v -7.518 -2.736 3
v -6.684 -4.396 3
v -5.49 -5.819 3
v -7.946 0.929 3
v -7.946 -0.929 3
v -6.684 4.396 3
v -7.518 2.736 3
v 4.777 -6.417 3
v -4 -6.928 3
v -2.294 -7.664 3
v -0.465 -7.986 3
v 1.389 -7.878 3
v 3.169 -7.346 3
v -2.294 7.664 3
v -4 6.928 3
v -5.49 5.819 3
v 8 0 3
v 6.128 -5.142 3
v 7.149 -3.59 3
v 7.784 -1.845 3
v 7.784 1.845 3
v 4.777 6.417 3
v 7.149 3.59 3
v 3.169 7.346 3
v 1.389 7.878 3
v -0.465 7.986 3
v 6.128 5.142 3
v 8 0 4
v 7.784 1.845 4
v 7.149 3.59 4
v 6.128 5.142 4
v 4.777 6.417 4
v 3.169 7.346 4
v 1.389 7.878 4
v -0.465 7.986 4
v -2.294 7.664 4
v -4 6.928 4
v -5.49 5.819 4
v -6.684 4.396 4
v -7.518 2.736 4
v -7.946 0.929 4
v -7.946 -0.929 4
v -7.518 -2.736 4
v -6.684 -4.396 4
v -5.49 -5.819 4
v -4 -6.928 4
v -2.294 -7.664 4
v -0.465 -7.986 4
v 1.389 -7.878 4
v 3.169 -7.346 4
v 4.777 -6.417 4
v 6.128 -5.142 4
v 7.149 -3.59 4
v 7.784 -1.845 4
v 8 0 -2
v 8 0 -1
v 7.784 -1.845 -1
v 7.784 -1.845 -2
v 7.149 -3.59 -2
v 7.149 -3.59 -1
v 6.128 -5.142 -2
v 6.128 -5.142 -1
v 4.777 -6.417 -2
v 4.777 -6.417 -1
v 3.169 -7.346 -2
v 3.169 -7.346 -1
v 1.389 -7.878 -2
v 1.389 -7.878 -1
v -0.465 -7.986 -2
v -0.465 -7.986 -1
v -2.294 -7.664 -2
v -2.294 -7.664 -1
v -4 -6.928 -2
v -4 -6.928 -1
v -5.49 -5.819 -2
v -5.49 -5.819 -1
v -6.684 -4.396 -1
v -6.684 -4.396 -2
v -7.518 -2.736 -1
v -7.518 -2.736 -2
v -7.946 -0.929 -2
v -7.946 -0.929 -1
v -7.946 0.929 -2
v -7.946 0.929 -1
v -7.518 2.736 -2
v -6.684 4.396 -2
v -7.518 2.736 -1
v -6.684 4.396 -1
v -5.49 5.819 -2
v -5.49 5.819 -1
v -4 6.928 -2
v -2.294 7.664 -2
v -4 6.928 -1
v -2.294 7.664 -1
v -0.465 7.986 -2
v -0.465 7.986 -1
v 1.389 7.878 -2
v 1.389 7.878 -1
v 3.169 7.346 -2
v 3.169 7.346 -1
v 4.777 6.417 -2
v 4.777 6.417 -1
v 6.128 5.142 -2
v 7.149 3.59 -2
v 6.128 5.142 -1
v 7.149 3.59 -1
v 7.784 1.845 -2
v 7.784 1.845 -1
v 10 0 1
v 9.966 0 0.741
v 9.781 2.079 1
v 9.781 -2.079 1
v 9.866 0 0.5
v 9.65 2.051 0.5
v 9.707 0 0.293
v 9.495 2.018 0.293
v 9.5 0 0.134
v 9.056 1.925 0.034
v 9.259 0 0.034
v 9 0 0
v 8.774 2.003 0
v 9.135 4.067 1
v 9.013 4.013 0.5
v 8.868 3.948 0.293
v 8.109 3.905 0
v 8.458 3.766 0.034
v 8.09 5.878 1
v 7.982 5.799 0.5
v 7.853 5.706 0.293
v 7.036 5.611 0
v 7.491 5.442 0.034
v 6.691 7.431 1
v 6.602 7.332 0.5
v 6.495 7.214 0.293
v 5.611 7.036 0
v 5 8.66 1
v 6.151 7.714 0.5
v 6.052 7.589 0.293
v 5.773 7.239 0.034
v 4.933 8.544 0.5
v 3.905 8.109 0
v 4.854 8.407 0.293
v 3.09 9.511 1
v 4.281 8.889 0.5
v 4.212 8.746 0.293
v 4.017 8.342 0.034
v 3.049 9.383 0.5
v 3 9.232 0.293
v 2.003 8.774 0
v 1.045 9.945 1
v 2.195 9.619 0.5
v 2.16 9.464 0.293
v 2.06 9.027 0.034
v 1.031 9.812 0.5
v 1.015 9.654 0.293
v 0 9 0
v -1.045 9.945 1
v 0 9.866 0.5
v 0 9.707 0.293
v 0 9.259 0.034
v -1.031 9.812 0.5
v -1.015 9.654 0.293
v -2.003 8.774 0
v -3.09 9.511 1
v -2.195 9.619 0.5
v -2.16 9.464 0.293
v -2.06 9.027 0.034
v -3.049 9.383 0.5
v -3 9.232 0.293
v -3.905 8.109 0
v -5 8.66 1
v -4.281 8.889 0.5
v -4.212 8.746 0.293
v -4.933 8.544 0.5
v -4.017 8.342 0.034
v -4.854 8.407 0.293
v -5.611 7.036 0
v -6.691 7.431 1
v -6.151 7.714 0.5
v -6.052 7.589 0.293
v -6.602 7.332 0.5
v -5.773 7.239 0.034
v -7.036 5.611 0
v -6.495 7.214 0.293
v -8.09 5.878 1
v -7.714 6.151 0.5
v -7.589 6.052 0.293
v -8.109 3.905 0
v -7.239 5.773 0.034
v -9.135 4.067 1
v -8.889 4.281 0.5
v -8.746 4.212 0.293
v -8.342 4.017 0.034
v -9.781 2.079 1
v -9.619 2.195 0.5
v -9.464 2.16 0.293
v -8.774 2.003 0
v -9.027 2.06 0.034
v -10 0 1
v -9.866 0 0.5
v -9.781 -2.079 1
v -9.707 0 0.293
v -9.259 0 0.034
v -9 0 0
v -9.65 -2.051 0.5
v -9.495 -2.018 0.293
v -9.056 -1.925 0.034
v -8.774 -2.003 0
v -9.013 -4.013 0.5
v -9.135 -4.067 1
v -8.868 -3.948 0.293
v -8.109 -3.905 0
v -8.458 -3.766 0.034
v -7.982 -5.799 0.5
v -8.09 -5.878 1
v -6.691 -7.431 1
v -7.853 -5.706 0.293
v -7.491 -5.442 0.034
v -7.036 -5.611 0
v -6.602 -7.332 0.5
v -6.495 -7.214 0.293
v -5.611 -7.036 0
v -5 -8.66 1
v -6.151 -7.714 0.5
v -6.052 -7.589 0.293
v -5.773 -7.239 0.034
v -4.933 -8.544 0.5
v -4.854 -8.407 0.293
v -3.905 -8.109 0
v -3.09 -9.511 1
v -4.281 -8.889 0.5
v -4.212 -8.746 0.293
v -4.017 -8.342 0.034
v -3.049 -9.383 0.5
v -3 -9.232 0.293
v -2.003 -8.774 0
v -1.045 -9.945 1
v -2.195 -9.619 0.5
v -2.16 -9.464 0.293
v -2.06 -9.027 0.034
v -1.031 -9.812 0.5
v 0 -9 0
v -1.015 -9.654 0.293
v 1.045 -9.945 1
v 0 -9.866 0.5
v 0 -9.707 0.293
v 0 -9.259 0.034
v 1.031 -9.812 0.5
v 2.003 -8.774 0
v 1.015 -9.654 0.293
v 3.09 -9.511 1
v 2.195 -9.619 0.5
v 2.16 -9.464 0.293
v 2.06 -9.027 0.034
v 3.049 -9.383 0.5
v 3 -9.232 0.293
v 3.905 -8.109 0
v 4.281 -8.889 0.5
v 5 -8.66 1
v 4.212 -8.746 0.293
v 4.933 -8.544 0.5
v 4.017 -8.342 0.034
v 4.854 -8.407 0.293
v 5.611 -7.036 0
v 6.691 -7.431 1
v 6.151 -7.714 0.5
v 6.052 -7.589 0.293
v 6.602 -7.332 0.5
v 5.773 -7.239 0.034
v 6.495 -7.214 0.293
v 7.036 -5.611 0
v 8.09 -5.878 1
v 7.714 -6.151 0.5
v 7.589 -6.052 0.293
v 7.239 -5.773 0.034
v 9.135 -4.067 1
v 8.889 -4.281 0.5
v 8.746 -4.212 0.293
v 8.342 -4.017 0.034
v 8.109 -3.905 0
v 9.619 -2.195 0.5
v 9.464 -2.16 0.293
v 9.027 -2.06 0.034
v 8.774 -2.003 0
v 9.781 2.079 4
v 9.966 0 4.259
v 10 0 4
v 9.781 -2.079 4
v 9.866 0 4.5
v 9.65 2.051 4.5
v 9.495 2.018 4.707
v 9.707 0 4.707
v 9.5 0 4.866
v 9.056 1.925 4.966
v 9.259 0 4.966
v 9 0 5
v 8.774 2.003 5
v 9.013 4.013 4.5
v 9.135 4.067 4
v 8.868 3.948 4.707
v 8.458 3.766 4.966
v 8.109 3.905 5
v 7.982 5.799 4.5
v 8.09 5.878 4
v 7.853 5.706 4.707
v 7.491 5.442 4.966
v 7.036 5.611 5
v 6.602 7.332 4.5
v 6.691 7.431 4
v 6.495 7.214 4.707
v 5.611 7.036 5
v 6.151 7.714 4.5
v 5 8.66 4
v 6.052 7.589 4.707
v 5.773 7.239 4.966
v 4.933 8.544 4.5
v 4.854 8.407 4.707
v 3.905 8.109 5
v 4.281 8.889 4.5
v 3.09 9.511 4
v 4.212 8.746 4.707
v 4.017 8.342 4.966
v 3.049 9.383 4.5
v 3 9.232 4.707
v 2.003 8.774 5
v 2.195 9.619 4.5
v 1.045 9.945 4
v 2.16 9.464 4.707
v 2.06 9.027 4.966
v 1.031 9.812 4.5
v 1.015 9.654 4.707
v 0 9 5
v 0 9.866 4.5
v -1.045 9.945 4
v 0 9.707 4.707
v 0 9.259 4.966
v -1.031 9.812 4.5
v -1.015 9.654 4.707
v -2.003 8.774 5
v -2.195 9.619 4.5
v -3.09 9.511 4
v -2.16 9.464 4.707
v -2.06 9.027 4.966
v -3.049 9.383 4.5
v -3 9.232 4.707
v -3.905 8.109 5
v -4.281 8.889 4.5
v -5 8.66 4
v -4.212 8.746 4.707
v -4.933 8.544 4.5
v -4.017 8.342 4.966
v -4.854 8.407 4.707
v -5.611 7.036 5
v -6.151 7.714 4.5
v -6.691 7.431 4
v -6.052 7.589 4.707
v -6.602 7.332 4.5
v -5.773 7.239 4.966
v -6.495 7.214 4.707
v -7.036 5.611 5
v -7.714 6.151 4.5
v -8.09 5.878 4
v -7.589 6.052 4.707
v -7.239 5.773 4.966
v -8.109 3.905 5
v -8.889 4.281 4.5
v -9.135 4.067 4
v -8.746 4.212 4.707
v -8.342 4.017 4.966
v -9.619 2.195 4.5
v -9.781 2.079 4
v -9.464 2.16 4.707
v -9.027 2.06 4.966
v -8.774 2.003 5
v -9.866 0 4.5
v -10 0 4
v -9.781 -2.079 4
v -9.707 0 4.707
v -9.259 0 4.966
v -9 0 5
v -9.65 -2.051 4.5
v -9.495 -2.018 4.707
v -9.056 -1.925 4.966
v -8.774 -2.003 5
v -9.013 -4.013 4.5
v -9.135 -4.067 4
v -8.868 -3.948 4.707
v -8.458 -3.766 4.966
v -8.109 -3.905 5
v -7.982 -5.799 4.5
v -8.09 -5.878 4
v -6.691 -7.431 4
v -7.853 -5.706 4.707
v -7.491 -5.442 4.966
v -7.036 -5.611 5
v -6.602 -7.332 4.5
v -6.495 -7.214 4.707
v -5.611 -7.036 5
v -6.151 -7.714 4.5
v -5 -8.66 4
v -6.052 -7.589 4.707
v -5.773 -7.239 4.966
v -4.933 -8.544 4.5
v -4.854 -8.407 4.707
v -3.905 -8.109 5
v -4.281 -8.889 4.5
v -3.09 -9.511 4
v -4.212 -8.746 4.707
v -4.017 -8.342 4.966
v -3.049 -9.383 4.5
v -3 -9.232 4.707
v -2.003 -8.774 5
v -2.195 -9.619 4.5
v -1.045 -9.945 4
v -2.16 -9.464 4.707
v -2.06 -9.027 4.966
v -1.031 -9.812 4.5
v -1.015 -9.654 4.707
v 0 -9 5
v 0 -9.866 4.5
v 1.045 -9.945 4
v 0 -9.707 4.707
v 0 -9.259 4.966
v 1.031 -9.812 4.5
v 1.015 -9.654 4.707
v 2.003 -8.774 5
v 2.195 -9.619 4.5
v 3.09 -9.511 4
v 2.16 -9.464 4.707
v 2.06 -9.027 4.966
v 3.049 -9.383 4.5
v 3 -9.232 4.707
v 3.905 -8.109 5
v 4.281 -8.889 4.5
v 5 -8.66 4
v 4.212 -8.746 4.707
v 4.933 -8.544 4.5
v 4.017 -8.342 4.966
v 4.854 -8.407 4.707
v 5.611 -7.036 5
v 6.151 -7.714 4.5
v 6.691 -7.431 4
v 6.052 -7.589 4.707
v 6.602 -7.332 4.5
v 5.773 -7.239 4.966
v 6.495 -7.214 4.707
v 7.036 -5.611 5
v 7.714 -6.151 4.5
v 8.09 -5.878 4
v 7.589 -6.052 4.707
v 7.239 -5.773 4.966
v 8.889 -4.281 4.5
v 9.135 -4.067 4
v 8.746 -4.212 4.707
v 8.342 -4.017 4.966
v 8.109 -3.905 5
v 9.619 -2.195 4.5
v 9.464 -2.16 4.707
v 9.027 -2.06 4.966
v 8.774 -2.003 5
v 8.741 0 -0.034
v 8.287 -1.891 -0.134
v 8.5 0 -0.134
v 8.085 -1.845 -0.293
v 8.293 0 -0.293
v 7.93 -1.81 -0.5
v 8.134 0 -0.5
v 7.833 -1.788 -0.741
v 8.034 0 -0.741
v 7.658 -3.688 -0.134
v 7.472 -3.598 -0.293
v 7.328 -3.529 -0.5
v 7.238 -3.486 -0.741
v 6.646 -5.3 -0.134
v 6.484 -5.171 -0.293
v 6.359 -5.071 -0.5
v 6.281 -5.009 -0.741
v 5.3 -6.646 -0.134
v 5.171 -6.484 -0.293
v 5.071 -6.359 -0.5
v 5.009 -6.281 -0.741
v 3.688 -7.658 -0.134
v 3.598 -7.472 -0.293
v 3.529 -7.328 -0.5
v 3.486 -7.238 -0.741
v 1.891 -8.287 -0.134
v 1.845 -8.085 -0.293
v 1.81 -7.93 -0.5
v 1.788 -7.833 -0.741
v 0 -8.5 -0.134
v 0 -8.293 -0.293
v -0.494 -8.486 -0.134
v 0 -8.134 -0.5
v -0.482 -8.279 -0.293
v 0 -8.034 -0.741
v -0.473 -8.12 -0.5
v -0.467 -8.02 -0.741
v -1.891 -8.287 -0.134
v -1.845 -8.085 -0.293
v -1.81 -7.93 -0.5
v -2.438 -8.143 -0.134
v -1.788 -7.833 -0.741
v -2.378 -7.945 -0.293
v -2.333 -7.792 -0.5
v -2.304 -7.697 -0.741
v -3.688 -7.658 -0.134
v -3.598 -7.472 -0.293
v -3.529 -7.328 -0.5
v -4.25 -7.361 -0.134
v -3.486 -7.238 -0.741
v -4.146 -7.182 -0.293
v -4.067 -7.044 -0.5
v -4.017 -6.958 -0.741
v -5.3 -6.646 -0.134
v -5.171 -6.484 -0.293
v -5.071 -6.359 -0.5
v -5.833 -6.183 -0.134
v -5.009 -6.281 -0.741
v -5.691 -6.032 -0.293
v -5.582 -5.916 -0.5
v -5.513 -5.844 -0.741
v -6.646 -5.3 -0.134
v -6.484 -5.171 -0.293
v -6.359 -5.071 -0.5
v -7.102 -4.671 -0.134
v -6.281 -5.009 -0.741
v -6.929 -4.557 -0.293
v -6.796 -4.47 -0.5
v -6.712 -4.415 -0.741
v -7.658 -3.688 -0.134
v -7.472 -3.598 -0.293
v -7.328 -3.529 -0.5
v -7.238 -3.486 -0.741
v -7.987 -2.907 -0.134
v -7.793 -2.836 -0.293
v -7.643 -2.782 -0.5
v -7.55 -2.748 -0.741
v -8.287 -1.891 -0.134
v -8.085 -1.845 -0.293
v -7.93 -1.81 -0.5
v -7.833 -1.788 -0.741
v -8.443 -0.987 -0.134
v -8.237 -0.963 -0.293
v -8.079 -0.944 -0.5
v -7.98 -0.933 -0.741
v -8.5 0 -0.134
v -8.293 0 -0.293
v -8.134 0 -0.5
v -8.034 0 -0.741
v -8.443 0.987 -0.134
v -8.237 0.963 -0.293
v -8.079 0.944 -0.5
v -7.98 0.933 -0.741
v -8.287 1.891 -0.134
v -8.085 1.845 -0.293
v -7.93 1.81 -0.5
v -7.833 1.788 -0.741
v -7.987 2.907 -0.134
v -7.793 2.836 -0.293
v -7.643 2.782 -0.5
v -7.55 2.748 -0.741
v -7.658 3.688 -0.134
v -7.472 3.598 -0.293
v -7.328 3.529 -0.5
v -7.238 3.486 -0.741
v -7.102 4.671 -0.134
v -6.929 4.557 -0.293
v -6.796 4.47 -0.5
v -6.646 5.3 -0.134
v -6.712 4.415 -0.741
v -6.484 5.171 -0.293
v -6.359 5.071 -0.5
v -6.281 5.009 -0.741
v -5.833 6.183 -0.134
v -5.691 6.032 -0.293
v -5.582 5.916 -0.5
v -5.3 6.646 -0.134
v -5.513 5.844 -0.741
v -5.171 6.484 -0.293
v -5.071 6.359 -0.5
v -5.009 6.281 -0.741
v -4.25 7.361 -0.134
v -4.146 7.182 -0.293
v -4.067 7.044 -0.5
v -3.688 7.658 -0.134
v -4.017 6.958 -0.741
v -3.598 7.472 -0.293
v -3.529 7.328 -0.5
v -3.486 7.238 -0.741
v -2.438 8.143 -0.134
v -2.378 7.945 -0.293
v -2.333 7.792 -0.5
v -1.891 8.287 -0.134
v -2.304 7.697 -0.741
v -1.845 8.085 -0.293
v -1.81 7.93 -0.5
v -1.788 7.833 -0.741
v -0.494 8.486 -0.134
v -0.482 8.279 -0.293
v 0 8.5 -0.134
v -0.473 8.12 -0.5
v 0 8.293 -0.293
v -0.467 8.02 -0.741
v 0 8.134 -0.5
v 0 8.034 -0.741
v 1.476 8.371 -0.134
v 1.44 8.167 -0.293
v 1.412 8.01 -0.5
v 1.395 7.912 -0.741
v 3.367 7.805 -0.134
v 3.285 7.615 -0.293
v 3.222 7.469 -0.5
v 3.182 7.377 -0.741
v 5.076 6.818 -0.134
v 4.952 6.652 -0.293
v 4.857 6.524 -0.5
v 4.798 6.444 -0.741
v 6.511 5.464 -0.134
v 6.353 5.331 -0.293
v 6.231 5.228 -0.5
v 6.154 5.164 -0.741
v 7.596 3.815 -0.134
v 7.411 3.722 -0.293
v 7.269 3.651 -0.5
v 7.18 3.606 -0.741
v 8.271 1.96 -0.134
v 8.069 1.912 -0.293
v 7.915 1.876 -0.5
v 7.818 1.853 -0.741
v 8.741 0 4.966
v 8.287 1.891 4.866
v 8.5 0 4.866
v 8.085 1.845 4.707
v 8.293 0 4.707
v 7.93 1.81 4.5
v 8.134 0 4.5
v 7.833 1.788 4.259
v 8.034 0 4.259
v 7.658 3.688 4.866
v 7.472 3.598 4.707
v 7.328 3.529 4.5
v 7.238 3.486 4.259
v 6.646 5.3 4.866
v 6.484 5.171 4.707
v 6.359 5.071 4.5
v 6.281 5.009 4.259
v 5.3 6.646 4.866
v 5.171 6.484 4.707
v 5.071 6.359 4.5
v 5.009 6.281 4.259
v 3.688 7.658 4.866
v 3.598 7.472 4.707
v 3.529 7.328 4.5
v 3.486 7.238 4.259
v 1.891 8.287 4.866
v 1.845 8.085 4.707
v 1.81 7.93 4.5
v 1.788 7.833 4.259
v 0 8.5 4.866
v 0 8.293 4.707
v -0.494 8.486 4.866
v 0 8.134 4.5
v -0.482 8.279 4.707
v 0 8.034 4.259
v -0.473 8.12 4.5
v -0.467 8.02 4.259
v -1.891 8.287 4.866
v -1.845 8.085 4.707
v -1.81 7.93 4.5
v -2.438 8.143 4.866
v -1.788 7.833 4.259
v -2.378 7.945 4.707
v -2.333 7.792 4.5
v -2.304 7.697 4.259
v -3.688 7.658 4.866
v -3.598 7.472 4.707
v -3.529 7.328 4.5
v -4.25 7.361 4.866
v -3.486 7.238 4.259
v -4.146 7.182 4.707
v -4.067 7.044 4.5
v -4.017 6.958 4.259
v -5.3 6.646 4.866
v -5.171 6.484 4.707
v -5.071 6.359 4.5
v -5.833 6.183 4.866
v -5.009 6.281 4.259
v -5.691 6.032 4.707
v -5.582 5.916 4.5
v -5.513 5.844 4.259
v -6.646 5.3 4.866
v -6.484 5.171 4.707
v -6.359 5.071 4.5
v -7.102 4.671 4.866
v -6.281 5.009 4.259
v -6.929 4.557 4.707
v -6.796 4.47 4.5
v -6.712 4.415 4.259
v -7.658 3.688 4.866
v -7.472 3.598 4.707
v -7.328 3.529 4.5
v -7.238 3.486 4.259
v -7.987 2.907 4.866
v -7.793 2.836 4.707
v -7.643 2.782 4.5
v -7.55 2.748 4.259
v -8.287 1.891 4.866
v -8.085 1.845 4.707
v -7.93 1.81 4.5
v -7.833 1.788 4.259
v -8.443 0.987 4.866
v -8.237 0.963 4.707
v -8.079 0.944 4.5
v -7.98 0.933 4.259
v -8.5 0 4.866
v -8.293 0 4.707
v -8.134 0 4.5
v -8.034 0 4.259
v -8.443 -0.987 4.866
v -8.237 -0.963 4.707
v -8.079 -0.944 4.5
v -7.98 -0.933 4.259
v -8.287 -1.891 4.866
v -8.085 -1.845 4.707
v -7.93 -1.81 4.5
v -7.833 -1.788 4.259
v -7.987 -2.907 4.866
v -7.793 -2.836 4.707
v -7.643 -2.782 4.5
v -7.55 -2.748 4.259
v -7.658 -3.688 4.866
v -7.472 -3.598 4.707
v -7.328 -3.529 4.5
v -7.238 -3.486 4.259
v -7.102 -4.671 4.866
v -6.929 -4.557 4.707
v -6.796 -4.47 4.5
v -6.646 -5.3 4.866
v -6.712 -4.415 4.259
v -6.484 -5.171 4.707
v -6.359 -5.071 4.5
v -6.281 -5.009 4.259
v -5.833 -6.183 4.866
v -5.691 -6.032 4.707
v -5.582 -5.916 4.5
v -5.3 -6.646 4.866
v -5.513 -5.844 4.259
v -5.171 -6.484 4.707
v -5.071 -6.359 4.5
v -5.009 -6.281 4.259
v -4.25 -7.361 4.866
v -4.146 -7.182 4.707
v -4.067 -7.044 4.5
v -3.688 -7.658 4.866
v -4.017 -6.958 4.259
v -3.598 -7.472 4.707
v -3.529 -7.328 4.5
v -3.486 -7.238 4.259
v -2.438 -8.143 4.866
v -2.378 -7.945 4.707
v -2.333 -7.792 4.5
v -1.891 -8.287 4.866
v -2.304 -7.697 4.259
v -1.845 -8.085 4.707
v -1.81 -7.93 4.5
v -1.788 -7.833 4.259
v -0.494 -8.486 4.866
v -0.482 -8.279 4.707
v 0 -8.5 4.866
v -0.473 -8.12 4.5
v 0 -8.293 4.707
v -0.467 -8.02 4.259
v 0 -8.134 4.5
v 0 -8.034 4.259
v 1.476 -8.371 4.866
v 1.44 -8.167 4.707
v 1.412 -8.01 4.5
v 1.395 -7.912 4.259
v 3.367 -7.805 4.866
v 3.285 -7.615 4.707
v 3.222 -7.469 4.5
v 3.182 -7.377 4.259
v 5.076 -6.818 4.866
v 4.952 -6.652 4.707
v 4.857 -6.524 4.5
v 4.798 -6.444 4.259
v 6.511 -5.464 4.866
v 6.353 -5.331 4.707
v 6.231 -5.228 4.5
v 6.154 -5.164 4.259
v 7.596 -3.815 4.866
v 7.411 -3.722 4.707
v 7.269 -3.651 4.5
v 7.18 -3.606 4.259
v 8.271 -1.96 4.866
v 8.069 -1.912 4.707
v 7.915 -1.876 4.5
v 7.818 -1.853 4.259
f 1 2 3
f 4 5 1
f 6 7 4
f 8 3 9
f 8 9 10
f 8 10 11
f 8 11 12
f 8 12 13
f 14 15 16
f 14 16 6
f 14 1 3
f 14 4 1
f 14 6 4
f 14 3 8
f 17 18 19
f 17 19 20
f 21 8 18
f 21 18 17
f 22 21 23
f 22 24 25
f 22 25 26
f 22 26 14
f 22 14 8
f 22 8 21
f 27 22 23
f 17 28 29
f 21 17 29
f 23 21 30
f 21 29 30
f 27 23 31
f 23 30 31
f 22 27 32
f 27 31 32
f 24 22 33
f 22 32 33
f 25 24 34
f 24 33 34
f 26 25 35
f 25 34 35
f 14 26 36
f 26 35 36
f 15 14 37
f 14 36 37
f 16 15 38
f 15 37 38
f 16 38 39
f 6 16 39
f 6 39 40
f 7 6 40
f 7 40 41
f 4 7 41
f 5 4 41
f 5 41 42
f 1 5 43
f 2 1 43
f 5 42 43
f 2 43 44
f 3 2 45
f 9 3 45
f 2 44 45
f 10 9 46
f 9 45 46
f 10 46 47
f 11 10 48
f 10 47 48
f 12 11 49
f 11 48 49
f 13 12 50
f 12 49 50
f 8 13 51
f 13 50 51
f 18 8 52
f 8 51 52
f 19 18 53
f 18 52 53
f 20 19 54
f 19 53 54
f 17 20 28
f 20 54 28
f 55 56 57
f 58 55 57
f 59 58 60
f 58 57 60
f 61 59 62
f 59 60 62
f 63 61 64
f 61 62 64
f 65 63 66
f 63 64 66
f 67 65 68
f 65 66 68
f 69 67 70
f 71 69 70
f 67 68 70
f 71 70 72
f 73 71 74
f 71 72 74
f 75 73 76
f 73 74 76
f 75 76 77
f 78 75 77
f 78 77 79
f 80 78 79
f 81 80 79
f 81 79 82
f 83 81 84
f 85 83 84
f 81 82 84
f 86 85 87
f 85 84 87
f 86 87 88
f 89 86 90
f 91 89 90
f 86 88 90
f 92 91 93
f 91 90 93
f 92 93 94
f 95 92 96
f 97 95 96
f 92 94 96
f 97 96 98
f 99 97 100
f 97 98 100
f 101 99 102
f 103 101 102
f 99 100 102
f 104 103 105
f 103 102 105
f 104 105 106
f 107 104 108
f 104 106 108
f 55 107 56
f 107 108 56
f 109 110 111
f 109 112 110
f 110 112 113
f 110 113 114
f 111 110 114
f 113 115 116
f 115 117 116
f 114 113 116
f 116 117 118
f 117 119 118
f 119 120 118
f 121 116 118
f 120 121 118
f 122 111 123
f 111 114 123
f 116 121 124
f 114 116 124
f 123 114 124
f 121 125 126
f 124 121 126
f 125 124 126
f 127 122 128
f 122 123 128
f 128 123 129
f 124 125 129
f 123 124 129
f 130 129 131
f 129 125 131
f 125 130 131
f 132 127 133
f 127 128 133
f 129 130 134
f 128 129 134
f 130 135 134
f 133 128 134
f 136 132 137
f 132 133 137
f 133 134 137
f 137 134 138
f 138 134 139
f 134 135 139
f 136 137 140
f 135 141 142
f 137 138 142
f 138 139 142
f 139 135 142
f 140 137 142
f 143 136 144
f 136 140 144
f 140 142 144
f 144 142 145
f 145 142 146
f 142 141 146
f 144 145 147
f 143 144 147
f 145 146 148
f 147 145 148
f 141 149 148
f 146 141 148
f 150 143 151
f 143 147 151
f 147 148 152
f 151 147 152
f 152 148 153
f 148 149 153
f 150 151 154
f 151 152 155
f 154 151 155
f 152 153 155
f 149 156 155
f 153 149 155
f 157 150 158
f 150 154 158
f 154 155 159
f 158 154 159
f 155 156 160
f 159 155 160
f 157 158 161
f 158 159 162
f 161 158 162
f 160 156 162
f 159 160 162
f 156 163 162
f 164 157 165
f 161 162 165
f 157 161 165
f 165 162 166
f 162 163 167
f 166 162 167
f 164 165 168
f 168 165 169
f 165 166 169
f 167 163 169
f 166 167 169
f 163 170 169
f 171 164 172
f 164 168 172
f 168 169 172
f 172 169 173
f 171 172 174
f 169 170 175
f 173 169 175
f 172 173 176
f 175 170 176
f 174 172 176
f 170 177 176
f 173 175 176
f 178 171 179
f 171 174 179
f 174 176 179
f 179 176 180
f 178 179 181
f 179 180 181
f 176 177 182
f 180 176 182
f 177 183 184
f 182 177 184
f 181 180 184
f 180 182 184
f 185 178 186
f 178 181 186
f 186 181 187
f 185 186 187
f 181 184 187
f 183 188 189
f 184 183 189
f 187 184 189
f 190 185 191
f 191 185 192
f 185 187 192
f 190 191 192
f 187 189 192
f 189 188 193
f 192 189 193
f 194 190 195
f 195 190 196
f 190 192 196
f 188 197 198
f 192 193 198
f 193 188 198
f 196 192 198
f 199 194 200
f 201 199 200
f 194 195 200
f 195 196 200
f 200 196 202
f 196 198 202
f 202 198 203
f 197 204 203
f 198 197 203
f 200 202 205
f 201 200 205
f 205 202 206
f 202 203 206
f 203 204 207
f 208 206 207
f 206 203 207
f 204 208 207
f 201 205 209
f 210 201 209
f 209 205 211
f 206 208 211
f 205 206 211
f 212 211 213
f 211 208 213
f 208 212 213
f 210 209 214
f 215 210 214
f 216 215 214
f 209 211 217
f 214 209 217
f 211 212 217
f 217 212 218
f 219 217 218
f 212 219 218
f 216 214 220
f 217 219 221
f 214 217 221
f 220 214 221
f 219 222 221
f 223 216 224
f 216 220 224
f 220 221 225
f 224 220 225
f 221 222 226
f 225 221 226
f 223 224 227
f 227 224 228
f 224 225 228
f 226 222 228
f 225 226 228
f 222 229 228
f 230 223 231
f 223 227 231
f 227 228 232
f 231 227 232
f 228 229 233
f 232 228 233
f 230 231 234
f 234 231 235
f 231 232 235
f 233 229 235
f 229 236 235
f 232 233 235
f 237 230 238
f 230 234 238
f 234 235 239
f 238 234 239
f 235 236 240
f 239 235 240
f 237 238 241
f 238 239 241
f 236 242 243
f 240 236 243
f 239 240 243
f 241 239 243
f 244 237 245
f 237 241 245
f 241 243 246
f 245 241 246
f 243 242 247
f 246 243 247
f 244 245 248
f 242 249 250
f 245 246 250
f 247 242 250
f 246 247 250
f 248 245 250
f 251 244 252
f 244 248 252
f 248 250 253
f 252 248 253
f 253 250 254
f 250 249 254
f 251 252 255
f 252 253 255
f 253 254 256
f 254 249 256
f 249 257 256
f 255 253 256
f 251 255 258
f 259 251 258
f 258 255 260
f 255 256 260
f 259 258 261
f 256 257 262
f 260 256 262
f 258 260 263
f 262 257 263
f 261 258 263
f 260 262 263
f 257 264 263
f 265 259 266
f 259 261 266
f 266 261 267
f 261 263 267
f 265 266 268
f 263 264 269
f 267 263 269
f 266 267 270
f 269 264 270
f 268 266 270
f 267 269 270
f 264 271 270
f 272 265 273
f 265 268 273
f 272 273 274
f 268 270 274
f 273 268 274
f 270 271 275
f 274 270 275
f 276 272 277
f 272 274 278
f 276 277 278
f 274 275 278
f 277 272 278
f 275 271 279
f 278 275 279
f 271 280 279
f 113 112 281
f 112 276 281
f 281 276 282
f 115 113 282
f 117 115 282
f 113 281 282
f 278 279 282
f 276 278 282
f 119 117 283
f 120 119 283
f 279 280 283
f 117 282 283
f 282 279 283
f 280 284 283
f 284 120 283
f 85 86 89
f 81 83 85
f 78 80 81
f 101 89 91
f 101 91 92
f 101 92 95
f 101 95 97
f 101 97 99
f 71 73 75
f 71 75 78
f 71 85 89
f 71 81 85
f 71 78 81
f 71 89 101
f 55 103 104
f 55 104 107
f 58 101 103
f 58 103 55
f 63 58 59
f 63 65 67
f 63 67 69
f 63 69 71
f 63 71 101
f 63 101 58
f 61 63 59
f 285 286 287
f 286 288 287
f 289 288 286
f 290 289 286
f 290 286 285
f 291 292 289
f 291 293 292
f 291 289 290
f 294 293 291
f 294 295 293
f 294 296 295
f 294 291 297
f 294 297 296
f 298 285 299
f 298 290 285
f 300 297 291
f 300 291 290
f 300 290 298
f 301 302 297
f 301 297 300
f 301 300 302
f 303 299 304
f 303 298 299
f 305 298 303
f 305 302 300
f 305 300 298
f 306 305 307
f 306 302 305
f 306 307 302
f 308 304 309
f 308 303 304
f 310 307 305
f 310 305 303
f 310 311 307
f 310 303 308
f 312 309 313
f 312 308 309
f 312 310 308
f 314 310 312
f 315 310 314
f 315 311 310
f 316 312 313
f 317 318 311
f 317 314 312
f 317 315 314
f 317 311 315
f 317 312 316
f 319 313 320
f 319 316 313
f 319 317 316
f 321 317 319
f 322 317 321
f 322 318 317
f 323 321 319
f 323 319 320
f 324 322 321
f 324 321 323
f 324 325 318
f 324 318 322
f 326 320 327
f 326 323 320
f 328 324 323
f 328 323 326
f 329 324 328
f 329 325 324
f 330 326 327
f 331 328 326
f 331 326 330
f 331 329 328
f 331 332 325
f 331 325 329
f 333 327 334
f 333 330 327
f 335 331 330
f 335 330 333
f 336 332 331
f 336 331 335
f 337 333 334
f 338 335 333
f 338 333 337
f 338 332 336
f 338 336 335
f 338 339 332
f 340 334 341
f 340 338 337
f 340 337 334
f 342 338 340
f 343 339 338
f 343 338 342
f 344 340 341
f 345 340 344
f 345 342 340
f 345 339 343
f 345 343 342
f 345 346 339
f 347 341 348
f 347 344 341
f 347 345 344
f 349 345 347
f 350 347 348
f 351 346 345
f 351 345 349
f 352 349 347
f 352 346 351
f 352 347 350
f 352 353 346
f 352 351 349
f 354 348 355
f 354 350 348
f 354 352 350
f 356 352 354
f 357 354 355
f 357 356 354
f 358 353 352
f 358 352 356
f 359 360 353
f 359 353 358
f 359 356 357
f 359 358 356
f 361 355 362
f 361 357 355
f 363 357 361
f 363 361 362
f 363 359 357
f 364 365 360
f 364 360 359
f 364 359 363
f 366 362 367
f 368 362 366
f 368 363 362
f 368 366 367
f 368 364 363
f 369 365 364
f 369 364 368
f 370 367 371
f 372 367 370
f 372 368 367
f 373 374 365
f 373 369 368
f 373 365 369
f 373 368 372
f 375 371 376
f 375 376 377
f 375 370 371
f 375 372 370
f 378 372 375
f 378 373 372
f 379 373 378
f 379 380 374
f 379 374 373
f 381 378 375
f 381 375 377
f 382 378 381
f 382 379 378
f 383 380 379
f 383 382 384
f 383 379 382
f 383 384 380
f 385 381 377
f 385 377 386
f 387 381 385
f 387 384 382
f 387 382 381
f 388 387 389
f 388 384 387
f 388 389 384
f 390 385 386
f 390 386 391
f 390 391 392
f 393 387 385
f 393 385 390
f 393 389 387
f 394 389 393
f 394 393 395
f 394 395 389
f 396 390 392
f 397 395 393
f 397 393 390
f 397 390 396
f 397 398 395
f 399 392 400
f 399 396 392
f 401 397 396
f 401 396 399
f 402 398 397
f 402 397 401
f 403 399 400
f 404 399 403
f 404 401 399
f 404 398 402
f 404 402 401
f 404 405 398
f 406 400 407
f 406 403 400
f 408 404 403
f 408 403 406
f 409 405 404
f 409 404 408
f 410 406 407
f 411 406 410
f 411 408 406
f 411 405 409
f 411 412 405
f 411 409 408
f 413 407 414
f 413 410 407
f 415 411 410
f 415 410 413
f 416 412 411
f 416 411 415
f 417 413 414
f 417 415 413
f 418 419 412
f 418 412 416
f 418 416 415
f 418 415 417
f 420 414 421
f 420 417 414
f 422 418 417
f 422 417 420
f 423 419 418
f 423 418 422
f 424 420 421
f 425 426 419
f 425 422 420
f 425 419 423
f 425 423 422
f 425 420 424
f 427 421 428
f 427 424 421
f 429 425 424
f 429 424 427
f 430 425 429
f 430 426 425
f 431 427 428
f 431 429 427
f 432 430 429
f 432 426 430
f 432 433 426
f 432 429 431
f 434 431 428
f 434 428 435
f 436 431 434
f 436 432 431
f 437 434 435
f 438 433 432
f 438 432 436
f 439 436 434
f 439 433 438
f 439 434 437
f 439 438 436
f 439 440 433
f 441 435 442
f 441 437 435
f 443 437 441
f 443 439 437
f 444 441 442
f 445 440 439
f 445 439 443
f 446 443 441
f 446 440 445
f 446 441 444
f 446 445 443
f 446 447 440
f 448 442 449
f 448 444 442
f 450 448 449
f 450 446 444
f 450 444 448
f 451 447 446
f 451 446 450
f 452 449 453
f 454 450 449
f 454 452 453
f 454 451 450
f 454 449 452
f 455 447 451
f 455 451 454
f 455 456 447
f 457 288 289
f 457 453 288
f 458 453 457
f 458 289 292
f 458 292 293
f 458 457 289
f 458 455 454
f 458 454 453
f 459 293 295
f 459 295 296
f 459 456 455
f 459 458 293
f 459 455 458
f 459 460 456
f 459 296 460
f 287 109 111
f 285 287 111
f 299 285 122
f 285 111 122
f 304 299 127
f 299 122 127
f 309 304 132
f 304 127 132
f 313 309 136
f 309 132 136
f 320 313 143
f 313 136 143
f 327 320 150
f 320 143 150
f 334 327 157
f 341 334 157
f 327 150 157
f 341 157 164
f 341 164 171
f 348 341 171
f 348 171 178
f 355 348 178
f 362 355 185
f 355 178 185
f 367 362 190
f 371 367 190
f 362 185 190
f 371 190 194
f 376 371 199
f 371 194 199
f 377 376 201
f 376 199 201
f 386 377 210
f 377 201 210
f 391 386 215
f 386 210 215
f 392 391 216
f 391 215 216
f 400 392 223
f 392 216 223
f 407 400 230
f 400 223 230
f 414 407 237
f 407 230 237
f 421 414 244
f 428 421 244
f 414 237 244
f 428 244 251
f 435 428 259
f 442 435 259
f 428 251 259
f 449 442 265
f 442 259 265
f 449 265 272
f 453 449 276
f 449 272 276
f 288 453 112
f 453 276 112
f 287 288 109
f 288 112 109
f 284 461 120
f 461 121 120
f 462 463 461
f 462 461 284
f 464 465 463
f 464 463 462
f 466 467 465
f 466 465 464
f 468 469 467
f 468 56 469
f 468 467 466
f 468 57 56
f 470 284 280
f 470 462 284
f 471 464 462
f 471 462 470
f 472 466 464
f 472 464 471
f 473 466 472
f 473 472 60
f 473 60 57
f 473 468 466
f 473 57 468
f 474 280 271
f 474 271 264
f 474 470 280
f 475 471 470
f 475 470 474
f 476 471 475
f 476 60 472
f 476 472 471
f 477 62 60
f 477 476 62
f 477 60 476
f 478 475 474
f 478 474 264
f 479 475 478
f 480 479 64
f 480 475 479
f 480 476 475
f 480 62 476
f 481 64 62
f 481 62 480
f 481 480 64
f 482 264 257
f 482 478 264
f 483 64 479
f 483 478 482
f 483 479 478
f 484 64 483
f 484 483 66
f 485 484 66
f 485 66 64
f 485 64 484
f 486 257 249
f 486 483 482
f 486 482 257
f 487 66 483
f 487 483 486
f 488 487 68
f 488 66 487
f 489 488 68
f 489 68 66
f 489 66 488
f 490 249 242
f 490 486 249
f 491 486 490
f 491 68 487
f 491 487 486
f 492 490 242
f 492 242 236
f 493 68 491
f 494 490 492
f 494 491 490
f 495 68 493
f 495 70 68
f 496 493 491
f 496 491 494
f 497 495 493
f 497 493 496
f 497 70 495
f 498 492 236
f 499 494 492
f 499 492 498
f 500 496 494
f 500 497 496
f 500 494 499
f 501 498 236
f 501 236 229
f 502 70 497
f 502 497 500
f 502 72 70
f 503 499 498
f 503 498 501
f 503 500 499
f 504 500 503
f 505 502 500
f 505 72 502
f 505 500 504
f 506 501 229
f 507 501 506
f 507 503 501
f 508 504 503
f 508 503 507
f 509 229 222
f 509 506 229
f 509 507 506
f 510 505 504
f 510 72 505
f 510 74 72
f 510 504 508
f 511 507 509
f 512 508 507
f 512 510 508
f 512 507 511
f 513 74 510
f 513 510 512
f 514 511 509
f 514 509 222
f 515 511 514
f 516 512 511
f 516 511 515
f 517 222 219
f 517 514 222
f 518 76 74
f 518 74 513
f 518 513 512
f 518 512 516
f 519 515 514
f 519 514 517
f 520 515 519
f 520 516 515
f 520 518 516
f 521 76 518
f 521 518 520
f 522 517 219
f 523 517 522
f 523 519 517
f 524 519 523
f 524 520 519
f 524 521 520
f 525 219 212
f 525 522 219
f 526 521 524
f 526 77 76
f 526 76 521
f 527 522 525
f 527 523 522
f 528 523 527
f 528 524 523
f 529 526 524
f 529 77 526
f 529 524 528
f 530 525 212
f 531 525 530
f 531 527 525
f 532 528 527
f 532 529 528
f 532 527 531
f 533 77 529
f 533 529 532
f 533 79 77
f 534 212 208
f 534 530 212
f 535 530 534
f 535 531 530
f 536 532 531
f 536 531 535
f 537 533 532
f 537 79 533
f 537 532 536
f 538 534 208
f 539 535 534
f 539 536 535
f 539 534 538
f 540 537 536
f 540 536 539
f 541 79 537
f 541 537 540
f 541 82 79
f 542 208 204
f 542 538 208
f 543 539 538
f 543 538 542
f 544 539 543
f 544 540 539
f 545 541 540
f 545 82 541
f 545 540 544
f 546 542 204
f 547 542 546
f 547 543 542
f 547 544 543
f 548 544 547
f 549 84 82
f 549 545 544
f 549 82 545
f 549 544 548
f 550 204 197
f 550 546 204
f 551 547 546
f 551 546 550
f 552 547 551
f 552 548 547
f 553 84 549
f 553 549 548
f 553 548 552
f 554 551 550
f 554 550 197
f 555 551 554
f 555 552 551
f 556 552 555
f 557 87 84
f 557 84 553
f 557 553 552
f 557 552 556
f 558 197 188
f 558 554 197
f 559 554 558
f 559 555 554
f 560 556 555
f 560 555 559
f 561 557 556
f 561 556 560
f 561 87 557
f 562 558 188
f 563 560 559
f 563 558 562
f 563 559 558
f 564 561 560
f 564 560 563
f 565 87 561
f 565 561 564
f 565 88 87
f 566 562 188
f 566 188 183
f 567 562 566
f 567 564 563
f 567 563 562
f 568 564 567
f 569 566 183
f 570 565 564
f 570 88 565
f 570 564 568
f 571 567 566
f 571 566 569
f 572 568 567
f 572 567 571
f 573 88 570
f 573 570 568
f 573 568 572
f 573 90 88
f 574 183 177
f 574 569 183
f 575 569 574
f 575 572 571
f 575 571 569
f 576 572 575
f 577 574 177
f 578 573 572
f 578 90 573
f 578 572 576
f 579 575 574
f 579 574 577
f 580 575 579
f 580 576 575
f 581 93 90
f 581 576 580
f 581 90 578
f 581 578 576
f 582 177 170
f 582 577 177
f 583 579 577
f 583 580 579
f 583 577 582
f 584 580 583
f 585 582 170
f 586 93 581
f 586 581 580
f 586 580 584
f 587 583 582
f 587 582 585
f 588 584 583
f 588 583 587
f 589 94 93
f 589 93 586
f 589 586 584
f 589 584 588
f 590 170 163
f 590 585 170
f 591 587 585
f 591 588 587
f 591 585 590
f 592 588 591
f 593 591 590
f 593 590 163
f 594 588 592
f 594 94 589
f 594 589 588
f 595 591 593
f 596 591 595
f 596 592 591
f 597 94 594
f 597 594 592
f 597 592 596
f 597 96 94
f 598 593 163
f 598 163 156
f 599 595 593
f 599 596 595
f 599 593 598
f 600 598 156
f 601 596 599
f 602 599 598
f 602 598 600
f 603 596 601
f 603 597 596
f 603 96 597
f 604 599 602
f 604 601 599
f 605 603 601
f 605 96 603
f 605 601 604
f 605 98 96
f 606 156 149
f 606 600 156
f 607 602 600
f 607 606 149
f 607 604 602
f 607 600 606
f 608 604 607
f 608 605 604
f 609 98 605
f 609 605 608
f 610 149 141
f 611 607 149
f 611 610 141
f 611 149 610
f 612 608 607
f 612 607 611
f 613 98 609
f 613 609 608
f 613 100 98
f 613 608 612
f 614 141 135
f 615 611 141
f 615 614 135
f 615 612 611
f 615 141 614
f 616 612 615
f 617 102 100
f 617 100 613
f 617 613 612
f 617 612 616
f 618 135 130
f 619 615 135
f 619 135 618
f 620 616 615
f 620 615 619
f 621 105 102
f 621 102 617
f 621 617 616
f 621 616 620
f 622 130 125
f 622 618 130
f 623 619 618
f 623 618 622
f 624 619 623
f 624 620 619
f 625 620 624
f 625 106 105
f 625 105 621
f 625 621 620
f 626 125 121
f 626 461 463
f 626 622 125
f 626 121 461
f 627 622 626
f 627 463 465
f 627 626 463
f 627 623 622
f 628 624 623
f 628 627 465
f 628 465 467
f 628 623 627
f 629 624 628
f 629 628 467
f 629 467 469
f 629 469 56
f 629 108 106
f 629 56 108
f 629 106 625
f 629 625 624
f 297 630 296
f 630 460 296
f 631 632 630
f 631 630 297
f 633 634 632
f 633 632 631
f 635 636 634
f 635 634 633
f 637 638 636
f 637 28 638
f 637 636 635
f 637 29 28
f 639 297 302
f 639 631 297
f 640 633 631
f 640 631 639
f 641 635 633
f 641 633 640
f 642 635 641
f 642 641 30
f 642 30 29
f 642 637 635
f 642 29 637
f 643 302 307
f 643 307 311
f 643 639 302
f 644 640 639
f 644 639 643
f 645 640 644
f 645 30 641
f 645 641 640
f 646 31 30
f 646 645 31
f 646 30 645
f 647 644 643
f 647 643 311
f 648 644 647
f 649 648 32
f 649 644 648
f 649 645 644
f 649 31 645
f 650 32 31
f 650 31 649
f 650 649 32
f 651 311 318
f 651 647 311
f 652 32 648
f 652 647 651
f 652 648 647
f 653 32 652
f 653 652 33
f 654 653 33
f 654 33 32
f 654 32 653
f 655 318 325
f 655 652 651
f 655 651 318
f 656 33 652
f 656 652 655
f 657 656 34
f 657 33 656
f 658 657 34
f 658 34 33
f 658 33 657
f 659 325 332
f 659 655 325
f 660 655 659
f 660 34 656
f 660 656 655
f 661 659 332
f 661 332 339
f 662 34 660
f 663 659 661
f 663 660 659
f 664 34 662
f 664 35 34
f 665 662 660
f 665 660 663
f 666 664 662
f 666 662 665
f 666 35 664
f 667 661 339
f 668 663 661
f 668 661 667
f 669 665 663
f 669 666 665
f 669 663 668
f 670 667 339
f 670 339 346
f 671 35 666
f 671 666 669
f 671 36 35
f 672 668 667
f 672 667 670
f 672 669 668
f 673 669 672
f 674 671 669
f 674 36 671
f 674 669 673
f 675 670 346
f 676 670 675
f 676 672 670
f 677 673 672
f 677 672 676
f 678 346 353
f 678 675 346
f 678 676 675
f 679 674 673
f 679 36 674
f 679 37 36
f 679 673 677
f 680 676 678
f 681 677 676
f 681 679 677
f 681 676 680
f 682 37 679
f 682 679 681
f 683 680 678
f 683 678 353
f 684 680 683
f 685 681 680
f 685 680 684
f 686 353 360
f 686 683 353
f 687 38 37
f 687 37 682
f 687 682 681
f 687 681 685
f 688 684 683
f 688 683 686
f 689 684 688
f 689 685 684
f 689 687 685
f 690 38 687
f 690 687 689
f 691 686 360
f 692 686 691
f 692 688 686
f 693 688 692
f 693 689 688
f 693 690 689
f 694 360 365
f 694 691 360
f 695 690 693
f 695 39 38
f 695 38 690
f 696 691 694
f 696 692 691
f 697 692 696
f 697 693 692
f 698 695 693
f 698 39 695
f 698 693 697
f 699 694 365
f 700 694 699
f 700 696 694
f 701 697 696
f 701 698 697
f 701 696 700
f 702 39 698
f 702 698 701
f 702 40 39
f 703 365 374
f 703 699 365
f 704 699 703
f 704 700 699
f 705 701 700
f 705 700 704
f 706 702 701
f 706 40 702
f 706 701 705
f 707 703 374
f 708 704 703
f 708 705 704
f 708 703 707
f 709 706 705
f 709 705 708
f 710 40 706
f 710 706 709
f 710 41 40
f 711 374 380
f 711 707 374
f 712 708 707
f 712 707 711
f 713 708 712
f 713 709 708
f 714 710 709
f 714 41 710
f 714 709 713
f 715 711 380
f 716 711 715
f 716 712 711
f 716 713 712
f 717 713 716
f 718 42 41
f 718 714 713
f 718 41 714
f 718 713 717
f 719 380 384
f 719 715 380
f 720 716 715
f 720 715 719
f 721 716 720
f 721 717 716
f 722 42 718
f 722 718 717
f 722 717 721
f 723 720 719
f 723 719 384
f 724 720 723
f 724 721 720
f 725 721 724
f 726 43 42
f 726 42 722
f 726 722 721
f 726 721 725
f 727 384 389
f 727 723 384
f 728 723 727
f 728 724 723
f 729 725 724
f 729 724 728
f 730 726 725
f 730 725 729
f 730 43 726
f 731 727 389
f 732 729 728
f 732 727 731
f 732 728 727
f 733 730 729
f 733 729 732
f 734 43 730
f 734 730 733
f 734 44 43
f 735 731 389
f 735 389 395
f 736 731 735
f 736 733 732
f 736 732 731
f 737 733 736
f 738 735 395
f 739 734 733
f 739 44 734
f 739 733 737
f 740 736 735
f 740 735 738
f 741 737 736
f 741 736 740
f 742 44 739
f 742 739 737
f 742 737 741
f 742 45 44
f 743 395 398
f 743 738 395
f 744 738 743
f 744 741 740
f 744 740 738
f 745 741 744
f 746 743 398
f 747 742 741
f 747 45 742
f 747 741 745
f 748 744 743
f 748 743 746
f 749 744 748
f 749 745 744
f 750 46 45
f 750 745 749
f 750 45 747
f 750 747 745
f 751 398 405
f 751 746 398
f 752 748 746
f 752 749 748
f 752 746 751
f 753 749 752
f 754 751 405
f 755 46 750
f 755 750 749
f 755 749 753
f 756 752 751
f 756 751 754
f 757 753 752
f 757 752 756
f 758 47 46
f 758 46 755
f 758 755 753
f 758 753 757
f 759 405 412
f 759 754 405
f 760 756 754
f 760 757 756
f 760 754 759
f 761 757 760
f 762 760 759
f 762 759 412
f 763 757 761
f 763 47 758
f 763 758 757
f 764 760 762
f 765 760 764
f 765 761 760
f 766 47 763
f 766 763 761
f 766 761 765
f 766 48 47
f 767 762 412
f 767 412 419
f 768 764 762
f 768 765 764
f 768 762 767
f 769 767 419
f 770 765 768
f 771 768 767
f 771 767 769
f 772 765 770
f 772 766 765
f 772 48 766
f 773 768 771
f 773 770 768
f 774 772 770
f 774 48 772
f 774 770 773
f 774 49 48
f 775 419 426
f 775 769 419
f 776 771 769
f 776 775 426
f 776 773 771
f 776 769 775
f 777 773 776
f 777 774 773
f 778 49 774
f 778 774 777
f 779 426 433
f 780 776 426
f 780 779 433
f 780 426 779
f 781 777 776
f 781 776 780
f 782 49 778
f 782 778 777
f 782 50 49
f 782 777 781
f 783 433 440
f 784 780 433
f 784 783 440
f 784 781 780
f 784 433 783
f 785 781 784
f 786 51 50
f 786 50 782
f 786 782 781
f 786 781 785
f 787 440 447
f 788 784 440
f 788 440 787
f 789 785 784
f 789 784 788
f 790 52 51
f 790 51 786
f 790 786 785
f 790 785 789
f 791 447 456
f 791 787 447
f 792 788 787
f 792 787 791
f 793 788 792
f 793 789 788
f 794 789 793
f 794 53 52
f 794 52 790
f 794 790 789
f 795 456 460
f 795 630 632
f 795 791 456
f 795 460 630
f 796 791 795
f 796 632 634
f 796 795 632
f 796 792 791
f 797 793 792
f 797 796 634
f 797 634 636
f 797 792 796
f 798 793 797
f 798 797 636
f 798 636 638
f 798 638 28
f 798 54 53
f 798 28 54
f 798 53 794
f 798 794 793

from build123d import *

# Parameters (mm, degrees)
F0_R     = 10
F1_DEPTH = 5
F2_R     = 8
F3_DEPTH = 2
F4_R     = 8
F5_DEPTH = 2
F6_R     = 0.99999


# Not quite as in the source:
# - a fillet or chamfer is up to 0.001 mm smaller than in the source, because OpenCascade refuses the exact size


with BuildPart() as f1:
    # F0 (on Top) → F1 (new body)
    with BuildSketch(Plane.XY):
        Circle(F0_R)
    extrude(amount=F1_DEPTH)

    # F2 (on face) → F3 (join)
    with BuildSketch(Plane(origin=(0, 0, 0), x_dir=(1, 0, 0), z_dir=(0, 0, -1))):
        Circle(F2_R)
    extrude(amount=F3_DEPTH)

    # F4 (on face) → F5 (cut)
    with BuildSketch(Plane.XY.offset(5)):
        Circle(F4_R)
    extrude(amount=-F5_DEPTH, mode=Mode.SUBTRACT)

    # F6 (radius 1 in the source; OpenCascade refuses exactly that, so slightly less here)
    f6_edges = [f1.edges().sort_by_distance(p)[0] for p in [
        (-8, 0, 0),
        (-10, 0, 0),
        (-10, 0, 5),
        (-8, 0, 5),
    ]]
    fillet(f6_edges, radius=F6_R)


solid = f1.part
